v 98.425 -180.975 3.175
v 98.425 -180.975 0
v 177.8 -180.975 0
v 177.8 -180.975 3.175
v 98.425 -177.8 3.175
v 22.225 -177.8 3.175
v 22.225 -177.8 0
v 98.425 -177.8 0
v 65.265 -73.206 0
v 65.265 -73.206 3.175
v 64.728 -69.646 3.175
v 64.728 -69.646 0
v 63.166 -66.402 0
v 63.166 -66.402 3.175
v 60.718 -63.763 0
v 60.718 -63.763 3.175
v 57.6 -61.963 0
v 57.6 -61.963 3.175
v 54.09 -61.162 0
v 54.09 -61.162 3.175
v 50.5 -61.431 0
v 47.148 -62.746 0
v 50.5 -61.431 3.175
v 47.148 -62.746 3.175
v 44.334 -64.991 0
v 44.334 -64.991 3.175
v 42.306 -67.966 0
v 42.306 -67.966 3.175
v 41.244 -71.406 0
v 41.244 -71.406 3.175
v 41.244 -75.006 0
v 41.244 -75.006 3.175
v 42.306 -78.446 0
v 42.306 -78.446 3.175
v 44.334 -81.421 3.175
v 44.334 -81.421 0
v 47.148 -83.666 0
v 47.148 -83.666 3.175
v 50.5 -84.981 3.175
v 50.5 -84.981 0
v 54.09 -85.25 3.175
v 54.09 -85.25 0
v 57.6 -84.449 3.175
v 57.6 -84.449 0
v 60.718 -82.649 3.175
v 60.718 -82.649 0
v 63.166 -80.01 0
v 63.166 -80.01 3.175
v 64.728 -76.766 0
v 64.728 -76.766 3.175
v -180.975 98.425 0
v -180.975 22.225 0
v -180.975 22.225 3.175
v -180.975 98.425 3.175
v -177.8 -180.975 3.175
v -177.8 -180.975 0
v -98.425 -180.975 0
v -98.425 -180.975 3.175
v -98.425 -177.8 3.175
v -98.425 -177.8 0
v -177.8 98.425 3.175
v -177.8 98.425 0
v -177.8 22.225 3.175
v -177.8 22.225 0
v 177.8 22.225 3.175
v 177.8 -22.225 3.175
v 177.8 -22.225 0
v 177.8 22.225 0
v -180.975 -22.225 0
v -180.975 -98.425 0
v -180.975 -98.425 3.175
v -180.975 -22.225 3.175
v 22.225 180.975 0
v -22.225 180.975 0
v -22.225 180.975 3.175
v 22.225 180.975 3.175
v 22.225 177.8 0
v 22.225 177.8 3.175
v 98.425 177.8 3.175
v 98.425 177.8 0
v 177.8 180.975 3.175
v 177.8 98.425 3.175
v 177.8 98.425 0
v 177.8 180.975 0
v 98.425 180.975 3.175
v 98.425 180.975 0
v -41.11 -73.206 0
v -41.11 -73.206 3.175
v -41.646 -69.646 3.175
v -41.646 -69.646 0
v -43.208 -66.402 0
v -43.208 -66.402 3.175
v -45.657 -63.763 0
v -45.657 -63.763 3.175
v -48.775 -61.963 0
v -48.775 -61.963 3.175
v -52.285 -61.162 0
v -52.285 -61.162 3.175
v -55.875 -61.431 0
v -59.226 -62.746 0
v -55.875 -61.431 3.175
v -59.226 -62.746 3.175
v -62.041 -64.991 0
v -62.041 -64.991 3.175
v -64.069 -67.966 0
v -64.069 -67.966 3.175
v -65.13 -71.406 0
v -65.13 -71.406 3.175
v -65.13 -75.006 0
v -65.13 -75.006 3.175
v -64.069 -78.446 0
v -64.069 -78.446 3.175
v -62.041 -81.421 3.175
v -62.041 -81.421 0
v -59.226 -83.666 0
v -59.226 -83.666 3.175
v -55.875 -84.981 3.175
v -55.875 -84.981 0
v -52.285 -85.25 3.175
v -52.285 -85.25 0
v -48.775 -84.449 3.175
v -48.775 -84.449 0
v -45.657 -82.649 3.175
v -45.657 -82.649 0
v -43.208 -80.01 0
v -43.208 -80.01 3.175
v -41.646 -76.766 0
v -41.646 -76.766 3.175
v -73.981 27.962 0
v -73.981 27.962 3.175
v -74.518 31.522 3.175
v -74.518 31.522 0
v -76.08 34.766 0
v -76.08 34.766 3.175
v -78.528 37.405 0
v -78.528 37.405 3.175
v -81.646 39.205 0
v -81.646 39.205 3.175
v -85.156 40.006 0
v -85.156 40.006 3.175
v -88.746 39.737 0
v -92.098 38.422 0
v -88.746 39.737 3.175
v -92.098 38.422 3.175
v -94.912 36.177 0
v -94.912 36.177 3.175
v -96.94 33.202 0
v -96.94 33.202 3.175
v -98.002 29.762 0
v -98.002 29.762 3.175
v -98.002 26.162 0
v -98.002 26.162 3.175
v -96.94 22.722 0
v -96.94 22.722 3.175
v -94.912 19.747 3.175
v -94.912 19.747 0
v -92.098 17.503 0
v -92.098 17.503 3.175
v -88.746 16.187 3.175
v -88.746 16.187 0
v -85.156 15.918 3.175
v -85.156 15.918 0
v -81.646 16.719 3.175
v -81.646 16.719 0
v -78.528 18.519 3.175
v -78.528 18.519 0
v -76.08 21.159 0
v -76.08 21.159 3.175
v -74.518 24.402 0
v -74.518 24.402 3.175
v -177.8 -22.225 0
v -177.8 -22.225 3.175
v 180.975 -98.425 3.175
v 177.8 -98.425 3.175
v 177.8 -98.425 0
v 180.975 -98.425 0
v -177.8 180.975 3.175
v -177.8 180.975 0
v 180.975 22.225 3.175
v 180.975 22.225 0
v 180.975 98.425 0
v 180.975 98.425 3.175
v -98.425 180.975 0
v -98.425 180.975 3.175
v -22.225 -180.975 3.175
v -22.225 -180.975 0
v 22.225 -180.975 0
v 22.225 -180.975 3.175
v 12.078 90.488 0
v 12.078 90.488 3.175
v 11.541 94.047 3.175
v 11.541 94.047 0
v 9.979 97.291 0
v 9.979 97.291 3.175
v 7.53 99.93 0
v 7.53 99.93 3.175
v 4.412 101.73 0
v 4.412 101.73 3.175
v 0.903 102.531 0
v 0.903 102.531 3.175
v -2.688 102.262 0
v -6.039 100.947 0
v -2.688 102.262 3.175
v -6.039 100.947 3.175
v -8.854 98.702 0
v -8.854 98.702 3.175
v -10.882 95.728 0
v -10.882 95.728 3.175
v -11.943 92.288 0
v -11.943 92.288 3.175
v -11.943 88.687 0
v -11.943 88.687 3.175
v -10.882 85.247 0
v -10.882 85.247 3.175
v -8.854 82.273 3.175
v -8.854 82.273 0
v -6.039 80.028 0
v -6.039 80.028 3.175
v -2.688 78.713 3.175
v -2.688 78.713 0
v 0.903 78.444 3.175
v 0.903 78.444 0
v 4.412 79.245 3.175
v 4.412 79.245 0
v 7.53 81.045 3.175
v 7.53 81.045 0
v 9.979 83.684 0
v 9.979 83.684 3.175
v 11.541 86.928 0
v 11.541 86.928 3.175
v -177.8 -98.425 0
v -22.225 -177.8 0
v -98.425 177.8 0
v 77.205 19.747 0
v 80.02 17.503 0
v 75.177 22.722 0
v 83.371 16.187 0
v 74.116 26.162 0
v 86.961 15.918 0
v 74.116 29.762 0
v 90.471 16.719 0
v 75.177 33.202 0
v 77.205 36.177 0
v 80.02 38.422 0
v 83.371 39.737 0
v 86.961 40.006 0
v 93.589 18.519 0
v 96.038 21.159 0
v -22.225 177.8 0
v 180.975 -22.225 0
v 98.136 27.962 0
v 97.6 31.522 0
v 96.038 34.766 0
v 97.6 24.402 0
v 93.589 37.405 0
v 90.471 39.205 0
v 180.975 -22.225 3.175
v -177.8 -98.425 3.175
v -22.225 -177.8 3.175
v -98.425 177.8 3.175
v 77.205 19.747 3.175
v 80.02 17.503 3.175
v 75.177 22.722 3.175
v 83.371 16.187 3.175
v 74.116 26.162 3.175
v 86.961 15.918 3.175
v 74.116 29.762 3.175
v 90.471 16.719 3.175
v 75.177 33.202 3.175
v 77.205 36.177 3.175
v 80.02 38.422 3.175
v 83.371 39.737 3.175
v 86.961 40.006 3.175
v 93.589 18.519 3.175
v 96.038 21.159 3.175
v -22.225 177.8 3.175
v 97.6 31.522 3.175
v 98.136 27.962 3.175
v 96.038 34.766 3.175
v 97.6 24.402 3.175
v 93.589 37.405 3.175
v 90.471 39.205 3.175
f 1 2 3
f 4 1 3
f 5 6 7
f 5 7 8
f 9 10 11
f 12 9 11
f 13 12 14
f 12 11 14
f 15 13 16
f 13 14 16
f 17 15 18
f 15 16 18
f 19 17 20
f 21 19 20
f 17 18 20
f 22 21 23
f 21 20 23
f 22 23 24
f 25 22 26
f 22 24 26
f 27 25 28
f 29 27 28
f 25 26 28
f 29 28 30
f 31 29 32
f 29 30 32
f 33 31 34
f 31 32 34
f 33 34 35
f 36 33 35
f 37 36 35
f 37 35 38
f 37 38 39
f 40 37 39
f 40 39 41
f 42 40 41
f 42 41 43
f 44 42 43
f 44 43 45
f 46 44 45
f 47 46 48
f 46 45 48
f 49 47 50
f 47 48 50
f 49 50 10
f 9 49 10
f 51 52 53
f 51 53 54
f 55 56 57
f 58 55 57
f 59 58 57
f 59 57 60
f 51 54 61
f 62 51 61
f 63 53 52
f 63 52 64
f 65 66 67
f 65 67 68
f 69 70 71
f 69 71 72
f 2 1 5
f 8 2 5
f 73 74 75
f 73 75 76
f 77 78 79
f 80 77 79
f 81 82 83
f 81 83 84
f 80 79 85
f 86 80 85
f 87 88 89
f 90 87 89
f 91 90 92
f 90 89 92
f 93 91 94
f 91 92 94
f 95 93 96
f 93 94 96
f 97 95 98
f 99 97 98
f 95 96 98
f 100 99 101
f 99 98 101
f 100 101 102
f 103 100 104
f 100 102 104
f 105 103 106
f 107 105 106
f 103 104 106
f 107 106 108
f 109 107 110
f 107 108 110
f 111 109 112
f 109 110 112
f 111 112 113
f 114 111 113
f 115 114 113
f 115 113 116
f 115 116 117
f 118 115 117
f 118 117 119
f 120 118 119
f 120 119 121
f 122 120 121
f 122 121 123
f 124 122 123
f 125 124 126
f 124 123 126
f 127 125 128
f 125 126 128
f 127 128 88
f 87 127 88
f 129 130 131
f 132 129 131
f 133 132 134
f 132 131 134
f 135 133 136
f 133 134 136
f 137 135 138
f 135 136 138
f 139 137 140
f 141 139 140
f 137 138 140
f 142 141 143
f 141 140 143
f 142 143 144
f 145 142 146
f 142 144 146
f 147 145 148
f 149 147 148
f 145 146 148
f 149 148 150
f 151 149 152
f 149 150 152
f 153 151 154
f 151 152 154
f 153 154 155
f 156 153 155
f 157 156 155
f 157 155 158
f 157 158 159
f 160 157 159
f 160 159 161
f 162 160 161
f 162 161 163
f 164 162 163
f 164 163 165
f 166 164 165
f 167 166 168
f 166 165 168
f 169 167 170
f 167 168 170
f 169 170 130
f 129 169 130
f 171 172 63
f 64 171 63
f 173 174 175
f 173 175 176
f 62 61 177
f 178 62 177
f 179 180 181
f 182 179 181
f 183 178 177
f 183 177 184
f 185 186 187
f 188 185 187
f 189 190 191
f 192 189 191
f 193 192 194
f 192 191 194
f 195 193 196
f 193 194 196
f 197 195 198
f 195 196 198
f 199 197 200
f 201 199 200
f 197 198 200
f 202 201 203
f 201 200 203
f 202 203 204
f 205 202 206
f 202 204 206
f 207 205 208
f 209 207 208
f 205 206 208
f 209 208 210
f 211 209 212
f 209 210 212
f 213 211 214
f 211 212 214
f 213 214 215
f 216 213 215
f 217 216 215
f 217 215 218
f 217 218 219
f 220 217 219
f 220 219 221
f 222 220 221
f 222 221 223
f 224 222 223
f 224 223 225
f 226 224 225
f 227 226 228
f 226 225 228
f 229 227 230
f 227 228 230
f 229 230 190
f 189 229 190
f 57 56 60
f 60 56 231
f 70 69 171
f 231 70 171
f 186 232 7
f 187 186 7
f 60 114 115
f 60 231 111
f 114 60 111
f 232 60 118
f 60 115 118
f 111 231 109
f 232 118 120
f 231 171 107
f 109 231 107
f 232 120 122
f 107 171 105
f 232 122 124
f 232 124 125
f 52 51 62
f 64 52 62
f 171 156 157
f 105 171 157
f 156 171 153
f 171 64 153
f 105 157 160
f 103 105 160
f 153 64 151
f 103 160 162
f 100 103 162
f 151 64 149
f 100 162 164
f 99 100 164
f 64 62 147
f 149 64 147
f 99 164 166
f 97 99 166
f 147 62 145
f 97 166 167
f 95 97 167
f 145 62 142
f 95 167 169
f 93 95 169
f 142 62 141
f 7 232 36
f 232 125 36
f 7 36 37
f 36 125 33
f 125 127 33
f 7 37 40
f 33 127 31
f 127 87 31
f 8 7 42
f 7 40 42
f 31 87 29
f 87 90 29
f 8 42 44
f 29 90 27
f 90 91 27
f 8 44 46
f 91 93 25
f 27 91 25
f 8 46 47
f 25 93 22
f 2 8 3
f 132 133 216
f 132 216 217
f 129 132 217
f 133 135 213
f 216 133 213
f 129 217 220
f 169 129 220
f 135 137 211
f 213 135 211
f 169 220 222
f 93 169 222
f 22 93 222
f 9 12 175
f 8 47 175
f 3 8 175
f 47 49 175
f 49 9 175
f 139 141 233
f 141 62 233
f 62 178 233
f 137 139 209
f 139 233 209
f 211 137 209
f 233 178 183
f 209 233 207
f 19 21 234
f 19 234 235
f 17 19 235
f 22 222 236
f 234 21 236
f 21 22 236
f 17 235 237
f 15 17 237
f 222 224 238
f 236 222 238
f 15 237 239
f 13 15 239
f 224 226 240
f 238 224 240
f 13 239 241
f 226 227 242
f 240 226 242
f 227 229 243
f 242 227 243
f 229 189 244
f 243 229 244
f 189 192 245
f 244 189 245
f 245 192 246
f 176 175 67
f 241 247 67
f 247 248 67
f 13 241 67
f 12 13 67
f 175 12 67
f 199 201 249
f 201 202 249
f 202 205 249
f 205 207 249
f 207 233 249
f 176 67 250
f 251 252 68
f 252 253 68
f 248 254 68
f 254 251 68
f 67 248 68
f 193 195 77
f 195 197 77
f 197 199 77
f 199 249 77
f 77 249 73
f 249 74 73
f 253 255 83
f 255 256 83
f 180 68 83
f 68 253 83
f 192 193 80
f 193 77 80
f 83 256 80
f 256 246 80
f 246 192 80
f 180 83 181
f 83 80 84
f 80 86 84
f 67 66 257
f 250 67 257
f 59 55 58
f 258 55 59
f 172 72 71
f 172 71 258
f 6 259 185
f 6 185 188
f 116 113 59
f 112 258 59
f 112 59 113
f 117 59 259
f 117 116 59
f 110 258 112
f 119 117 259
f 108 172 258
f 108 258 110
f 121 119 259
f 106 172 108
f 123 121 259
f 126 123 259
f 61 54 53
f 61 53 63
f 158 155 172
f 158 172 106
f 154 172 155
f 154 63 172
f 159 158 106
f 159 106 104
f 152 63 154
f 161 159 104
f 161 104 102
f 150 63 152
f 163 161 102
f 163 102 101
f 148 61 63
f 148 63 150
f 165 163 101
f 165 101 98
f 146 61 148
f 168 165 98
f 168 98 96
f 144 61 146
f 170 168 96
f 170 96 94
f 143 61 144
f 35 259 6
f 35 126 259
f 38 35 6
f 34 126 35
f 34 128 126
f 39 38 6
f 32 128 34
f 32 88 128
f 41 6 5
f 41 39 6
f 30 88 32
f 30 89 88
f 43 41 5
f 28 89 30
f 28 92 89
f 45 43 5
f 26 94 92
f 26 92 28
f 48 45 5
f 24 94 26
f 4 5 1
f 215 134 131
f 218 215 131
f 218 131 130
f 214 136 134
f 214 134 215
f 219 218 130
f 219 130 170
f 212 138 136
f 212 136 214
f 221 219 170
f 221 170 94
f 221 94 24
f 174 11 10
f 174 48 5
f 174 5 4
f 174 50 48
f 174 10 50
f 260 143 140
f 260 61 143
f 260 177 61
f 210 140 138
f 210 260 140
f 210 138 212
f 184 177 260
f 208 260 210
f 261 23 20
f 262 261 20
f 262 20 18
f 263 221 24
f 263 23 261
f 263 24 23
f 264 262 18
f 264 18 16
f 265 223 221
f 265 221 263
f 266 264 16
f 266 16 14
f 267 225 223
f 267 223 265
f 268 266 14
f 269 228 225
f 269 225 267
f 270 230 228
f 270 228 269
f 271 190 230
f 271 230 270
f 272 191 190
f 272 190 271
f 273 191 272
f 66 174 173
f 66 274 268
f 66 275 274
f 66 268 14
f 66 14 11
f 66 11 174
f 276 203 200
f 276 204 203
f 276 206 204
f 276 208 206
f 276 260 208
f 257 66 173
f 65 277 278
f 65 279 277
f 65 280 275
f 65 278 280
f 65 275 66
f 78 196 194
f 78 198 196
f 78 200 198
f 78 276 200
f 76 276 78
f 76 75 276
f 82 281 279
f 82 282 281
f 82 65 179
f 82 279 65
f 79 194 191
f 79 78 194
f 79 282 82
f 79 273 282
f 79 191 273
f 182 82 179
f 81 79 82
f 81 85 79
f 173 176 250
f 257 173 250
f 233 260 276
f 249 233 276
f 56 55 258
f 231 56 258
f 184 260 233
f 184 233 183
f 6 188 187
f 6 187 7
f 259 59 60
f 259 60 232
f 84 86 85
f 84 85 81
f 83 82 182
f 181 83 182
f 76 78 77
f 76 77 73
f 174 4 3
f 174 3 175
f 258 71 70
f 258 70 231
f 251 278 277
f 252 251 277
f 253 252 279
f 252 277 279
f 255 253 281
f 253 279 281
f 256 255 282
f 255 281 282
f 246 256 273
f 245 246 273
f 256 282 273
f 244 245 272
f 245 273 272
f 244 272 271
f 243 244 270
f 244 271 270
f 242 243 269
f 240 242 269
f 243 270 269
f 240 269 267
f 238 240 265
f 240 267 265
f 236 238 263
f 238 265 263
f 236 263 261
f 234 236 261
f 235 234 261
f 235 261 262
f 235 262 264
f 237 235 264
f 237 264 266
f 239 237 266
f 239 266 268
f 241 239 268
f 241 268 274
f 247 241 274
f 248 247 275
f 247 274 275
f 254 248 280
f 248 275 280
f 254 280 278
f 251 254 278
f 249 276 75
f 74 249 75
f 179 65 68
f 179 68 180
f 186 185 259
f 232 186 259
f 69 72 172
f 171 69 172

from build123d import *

# Parameters (mm, degrees)
SKETCH1_W           = 361.95
SKETCH1_H           = 361.95
BOSS_EXTRUDE1_DEPTH = 3.175
SKETCH2_W           = 76.2
SKETCH2_H           = 3.175
CUT_EXTRUDE1_DEPTH  = 3.175
SKETCH3_R           = 12.0777
SKETCH3_W           = 3.175
SKETCH3_H           = 82.55
SKETCH3_H_2         = 44.45
CUT_EXTRUDE2_DEPTH  = 3.175


with BuildPart() as part:
    # Sketch1 → Boss-Extrude1 (new body)
    with BuildSketch(Plane.XY):
        Rectangle(SKETCH1_W, SKETCH1_H)
    extrude(amount=BOSS_EXTRUDE1_DEPTH)

    # Sketch2 → Cut-Extrude1 (cut)
    with BuildSketch(Plane.XY.offset(3.175)):
        with Locations((-60.325, 179.3875)):
            Rectangle(SKETCH2_W, SKETCH2_H)
        with Locations((60.325, 179.3875)):
            Rectangle(SKETCH2_W, SKETCH2_H)
        with Locations((60.325, -179.3875)):
            Rectangle(SKETCH2_W, SKETCH2_H)
        with Locations((-60.325, -179.3875)):
            Rectangle(SKETCH2_W, SKETCH2_H)
    extrude(amount=-CUT_EXTRUDE1_DEPTH, mode=Mode.SUBTRACT)

    # Sketch3 → Cut-Extrude2 (cut)
    with BuildSketch(Plane.XY.offset(3.175)):
        with Locations((0, 90.4875)):
            Circle(SKETCH3_R)
        with Locations((86.058726518, 27.962175279)):
            Circle(SKETCH3_R)
        with Locations((53.187218017, -73.205925279)):
            Circle(SKETCH3_R)
        with Locations((-53.187218017, -73.205925279)):
            Circle(SKETCH3_R)
        with Locations((-86.058726518, 27.962175279)):
            Circle(SKETCH3_R)
        with Locations((-179.3875, 139.7)):
            Rectangle(SKETCH3_W, SKETCH3_H)
        with Locations((-179.3875, 0)):
            Rectangle(SKETCH3_W, SKETCH3_H_2)
        with Locations((-179.3875, -139.7)):
            Rectangle(SKETCH3_W, SKETCH3_H)
        with Locations((179.3875, -139.7)):
            Rectangle(SKETCH3_W, SKETCH3_H)
        with Locations((179.3875, 0)):
            Rectangle(SKETCH3_W, SKETCH3_H_2)
        with Locations((179.3875, 139.7)):
            Rectangle(SKETCH3_W, SKETCH3_H)
    extrude(amount=-CUT_EXTRUDE2_DEPTH, mode=Mode.SUBTRACT)


solid = part.part
